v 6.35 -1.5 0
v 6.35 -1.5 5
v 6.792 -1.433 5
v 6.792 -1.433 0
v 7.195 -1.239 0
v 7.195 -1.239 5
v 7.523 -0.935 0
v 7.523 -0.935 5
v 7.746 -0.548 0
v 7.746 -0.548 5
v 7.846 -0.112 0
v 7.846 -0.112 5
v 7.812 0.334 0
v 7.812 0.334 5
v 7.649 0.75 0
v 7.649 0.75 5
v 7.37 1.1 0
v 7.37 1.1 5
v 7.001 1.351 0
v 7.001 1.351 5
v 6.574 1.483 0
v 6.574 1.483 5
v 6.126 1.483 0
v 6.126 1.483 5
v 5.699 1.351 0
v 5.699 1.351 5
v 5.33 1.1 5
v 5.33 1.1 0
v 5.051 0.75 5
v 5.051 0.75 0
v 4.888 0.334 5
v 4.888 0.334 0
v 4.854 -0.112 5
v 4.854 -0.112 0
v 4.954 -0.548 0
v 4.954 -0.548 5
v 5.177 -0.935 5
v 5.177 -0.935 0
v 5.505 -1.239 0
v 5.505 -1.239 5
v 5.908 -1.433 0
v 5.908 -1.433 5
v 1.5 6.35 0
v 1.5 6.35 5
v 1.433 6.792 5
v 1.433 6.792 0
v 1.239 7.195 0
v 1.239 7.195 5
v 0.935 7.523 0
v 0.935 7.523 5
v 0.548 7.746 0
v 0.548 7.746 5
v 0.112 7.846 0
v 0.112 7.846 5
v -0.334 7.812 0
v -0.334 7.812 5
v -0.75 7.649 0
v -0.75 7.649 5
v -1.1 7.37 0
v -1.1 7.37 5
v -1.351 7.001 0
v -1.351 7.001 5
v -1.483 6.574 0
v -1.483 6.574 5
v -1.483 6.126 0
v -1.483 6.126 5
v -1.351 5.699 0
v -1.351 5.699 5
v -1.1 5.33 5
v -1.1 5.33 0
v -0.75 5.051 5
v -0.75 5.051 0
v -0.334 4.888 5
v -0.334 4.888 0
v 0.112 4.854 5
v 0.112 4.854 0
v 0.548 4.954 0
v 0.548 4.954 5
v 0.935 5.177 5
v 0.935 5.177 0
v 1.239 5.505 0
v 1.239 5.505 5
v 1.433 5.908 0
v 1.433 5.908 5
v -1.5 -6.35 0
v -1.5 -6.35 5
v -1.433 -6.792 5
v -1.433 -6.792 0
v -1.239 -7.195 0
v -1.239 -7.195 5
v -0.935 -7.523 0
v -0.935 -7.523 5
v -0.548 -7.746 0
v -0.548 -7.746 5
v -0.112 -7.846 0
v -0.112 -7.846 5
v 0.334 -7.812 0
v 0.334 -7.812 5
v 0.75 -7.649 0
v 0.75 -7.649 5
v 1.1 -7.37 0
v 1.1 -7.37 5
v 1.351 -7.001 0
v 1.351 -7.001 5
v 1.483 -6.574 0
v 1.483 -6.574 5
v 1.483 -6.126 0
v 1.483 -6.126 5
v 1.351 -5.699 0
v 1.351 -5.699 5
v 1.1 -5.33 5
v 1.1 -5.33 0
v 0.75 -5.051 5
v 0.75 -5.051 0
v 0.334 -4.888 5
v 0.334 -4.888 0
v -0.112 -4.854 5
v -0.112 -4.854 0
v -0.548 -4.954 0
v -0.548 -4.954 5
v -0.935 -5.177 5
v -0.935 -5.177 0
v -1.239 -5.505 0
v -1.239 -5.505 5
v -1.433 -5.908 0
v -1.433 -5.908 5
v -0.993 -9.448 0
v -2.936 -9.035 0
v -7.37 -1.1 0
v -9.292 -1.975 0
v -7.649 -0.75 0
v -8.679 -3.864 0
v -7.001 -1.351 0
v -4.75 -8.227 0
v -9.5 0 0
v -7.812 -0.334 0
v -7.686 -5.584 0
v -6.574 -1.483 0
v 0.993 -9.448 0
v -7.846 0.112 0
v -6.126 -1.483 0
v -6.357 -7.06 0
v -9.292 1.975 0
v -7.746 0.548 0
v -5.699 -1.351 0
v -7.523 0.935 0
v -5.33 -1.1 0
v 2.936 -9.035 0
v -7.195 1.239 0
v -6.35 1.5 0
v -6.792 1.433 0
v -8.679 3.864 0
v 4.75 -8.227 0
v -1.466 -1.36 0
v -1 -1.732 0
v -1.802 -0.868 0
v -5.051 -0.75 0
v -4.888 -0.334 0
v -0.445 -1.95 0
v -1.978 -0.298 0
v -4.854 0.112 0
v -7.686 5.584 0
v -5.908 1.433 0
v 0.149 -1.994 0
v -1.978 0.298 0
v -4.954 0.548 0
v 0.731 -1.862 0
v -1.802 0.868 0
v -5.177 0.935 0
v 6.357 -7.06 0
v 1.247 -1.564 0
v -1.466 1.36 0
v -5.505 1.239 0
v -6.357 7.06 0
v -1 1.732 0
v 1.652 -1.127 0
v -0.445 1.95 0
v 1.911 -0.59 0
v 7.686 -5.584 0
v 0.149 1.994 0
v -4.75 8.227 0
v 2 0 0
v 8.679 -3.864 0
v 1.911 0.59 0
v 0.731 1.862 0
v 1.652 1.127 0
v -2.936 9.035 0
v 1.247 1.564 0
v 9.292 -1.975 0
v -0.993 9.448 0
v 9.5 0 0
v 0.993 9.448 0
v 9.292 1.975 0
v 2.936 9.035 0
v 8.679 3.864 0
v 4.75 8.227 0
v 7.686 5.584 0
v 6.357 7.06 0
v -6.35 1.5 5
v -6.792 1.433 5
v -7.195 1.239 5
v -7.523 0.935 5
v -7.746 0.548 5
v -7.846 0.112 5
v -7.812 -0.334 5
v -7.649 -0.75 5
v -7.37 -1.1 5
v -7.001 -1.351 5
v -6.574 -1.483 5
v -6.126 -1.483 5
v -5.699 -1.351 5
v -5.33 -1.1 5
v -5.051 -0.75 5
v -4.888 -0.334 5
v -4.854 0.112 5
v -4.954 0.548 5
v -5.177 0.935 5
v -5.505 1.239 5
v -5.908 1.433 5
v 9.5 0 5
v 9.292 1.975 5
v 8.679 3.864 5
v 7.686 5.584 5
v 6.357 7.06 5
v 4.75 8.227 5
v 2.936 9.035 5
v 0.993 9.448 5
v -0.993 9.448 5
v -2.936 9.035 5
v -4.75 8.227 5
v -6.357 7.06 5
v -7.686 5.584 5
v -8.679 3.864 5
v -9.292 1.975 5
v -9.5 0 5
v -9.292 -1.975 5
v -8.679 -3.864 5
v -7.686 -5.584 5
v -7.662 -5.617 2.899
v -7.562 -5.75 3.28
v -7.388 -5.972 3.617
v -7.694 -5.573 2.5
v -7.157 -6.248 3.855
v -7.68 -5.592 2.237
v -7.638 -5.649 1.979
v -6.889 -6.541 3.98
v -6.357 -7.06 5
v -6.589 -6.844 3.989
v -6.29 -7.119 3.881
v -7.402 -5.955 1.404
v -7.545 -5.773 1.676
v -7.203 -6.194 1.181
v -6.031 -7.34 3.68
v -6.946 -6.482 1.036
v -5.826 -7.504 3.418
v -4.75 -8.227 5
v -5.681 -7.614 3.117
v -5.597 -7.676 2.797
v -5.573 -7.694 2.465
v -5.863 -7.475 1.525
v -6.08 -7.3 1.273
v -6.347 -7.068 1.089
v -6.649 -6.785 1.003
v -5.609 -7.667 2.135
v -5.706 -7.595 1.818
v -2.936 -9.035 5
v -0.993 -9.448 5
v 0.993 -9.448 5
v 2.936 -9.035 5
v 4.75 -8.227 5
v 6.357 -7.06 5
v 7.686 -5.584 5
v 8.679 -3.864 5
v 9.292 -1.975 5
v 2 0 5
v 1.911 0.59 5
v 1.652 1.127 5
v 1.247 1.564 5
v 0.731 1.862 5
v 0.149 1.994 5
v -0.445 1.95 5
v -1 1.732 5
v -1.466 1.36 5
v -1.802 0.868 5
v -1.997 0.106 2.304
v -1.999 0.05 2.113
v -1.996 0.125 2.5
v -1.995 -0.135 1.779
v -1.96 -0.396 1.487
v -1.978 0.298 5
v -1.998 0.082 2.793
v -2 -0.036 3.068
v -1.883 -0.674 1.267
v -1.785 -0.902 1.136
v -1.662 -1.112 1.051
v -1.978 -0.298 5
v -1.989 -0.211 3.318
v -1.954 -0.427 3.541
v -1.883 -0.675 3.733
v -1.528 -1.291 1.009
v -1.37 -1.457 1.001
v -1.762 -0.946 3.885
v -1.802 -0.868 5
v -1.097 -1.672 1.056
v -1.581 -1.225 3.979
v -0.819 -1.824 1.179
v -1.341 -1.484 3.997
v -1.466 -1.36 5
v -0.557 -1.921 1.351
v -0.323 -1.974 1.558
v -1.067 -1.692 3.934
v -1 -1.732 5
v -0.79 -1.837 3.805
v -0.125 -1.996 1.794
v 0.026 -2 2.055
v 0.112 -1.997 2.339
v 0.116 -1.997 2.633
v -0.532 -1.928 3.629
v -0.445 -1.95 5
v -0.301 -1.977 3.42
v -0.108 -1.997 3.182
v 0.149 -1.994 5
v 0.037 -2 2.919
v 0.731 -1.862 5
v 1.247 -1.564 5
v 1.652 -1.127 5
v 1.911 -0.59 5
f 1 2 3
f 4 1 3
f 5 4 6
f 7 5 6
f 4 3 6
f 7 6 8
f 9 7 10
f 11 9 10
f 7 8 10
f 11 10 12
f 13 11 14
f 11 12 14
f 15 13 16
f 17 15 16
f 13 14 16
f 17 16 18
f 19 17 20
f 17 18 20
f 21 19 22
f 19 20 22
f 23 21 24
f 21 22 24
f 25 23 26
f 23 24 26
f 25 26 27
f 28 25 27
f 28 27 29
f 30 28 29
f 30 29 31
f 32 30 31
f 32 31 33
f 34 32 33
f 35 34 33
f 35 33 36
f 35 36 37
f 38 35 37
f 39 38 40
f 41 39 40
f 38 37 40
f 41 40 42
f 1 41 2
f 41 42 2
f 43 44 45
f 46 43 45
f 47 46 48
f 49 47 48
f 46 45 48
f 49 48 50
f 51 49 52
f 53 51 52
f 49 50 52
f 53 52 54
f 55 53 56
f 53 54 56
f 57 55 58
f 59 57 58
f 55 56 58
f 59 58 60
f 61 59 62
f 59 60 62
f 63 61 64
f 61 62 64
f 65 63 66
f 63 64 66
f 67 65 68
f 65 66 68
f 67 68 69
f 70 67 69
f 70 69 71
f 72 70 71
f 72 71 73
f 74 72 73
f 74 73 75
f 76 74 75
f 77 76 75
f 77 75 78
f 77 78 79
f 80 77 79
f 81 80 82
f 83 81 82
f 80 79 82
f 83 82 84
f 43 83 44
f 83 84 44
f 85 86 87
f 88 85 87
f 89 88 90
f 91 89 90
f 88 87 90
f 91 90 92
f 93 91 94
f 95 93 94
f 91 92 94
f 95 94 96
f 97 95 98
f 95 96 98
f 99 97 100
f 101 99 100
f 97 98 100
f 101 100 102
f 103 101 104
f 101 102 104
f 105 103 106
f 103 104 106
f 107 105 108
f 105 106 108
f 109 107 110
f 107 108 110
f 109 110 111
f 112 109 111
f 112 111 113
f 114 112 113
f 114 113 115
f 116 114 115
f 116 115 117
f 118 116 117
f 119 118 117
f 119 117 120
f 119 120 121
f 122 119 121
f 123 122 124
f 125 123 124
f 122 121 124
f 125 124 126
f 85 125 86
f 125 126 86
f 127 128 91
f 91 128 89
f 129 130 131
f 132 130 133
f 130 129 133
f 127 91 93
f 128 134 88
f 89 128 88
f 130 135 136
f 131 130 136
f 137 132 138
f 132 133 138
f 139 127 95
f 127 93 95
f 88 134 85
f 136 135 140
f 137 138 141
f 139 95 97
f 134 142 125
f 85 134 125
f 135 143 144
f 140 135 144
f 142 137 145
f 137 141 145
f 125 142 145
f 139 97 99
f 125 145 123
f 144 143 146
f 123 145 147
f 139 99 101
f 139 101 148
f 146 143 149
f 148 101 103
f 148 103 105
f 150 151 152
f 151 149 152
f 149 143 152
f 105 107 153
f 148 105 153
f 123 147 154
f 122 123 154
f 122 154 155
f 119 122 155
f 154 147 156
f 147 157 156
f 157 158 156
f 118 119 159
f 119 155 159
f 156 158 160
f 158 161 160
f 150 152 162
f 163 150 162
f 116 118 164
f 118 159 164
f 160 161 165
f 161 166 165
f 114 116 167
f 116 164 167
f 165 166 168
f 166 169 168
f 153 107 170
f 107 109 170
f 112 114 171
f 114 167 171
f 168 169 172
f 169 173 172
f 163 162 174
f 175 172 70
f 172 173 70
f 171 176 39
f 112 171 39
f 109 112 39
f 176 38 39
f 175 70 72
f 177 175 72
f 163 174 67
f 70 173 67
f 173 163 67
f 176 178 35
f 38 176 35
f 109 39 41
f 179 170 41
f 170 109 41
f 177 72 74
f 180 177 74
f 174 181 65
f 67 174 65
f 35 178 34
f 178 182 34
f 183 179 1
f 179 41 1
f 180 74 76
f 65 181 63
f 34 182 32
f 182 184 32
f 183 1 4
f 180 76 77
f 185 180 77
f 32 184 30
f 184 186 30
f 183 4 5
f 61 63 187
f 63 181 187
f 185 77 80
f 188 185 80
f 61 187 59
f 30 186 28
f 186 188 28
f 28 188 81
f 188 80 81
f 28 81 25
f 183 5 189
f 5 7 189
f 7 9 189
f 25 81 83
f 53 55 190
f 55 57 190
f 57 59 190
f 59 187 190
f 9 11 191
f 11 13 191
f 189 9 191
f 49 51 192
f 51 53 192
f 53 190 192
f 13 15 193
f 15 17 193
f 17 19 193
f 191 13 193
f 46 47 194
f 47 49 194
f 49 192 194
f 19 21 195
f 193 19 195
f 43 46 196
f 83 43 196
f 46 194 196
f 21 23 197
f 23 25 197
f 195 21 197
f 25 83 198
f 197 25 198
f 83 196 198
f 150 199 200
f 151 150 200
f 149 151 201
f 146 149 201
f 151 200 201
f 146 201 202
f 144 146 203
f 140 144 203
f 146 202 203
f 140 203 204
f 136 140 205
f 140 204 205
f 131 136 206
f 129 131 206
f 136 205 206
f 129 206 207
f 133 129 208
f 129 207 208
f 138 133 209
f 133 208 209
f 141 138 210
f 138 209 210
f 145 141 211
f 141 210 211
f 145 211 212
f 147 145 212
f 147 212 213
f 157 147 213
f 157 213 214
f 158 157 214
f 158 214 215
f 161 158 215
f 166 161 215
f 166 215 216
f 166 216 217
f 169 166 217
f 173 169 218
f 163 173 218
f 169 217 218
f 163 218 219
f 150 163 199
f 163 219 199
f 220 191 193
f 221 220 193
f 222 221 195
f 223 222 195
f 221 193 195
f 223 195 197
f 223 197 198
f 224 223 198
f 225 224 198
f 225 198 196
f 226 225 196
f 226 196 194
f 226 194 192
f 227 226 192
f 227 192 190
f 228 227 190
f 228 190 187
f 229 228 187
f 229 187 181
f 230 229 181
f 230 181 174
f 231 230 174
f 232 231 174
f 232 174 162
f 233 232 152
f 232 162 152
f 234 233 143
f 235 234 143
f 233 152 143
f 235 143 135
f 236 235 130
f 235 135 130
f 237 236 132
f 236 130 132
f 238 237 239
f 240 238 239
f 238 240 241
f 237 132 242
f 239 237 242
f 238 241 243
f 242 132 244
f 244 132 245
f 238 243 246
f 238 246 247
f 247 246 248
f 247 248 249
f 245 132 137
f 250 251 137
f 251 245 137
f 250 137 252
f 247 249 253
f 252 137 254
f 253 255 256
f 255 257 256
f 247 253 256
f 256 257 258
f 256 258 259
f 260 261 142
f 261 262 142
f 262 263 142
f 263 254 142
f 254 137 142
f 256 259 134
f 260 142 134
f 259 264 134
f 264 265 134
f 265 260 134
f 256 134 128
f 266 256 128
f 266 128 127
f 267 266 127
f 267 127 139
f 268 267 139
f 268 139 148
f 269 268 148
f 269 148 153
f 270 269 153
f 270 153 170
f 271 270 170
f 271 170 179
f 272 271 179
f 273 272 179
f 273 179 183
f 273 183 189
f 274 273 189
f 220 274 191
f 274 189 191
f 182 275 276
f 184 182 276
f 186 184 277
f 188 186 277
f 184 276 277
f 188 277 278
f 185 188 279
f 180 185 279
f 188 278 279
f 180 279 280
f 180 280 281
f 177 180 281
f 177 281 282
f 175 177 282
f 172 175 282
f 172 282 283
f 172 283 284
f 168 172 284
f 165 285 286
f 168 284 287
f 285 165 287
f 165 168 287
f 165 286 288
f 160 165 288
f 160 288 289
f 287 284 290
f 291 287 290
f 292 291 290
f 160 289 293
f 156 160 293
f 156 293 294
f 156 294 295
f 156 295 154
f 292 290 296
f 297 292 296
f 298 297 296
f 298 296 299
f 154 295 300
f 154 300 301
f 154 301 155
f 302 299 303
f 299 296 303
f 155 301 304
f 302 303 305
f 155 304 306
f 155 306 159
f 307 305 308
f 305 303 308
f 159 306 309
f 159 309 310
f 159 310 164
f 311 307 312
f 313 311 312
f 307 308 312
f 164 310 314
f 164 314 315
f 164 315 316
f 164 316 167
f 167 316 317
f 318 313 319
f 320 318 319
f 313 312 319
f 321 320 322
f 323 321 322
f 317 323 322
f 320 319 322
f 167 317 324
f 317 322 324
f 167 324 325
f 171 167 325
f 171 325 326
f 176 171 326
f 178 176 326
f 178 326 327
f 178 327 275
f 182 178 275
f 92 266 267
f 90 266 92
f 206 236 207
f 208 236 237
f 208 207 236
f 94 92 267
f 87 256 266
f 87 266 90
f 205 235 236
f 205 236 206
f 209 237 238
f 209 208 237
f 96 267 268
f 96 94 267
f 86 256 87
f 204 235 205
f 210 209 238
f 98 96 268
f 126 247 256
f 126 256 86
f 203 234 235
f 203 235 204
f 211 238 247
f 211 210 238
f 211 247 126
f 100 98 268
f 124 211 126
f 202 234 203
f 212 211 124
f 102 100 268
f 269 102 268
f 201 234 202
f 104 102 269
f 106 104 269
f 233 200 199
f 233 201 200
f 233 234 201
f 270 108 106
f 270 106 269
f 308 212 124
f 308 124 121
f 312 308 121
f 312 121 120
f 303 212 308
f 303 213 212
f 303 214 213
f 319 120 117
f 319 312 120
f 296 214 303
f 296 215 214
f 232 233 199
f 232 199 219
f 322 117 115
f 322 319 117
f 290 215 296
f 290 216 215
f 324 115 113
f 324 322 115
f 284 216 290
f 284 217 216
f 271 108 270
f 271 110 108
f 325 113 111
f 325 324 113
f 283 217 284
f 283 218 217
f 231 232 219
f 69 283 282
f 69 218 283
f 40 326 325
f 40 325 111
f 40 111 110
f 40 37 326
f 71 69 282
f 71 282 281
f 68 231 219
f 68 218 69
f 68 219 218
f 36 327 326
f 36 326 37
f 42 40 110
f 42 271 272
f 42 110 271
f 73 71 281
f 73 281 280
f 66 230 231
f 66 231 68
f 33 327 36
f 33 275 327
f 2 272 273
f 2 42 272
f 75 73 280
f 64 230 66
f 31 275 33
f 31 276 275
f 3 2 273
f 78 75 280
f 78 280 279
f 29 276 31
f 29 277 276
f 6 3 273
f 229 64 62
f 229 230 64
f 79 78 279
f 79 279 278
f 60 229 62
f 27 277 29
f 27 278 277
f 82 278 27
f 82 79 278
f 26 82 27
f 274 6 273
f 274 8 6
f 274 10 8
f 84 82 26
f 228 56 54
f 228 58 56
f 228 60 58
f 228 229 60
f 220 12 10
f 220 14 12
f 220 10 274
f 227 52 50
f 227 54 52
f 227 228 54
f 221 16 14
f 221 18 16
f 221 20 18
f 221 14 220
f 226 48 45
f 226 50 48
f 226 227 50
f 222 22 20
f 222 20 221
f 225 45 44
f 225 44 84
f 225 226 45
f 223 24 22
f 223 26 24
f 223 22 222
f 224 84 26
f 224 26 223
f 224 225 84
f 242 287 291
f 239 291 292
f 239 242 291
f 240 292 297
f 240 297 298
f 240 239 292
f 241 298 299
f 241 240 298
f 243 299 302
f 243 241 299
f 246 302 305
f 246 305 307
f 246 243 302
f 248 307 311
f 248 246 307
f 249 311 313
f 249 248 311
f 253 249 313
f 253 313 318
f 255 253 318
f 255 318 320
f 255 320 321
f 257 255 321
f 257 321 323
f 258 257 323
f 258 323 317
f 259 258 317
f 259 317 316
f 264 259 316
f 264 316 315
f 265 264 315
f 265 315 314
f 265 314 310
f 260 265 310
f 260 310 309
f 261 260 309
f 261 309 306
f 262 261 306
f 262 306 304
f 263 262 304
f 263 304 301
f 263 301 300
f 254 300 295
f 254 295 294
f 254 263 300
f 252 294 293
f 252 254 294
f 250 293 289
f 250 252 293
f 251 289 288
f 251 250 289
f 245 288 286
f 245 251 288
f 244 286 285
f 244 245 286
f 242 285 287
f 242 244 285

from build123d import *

# Parameters (mm, degrees)
PAD001_DEPTH       = 10
SKETCH007_R        = 1.5
PAD002_DEPTH       = 15
SKETCH_R           = 9.5
PAD_DEPTH          = 5
SKETCH001_R        = 2
POCKET_DEPTH       = 5
SKETCH002_R        = 1.5
POCKET001_DEPTH    = 5
POLARPATTERN_COUNT = 4


with BuildPart() as body001:
    # Sketch006 → Pad001 (new body)
    with BuildSketch(Plane.XY):
        Polygon((-21.213203, 0), (0, -21.213203), (-21.213203, -21.213203), align=None)
    extrude(amount=PAD001_DEPTH)

    # Sketch007 (on Face1 of Pad001) → Pad002 (join)
    with BuildSketch(Plane(origin=(-10.606602, -10.606602, 0), x_dir=(-0.707107, 0.707107, 0), z_dir=(0.707107, 0.707107, 0))):
        with Locations((0, 2.5)):
            Circle(SKETCH007_R)
    extrude(amount=PAD002_DEPTH)


with BuildPart() as body:
    # Sketch → Pad (new body)
    with BuildSketch(Plane.XY):
        Circle(SKETCH_R)
    extrude(amount=PAD_DEPTH)

    # Sketch001 (on Face3 of Pad) → Pocket (cut)
    with BuildSketch(Plane.XY.offset(5)):
        Circle(SKETCH001_R)
    extrude(amount=-POCKET_DEPTH, mode=Mode.SUBTRACT)

    # Sketch002 (on Face3 of Pocket) → Pocket001 (cut)
    with BuildSketch(Plane.XY.offset(5)):
        with Locations((0, 6.35)):
            Circle(SKETCH002_R)
    pocket001 = extrude(amount=-POCKET001_DEPTH, mode=Mode.SUBTRACT)

    # PolarPattern: Pocket001 ×4 about axis
    polarpattern_axis = Axis((0, 0, 5), (0, 0, 1))
    for i in range(1, POLARPATTERN_COUNT):
        add(pocket001.rotate(polarpattern_axis, i * 360 / POLARPATTERN_COUNT), mode=Mode.SUBTRACT)

    # Boolean: cut Body001
    add(body001.part, mode=Mode.SUBTRACT)


solid = body.part
